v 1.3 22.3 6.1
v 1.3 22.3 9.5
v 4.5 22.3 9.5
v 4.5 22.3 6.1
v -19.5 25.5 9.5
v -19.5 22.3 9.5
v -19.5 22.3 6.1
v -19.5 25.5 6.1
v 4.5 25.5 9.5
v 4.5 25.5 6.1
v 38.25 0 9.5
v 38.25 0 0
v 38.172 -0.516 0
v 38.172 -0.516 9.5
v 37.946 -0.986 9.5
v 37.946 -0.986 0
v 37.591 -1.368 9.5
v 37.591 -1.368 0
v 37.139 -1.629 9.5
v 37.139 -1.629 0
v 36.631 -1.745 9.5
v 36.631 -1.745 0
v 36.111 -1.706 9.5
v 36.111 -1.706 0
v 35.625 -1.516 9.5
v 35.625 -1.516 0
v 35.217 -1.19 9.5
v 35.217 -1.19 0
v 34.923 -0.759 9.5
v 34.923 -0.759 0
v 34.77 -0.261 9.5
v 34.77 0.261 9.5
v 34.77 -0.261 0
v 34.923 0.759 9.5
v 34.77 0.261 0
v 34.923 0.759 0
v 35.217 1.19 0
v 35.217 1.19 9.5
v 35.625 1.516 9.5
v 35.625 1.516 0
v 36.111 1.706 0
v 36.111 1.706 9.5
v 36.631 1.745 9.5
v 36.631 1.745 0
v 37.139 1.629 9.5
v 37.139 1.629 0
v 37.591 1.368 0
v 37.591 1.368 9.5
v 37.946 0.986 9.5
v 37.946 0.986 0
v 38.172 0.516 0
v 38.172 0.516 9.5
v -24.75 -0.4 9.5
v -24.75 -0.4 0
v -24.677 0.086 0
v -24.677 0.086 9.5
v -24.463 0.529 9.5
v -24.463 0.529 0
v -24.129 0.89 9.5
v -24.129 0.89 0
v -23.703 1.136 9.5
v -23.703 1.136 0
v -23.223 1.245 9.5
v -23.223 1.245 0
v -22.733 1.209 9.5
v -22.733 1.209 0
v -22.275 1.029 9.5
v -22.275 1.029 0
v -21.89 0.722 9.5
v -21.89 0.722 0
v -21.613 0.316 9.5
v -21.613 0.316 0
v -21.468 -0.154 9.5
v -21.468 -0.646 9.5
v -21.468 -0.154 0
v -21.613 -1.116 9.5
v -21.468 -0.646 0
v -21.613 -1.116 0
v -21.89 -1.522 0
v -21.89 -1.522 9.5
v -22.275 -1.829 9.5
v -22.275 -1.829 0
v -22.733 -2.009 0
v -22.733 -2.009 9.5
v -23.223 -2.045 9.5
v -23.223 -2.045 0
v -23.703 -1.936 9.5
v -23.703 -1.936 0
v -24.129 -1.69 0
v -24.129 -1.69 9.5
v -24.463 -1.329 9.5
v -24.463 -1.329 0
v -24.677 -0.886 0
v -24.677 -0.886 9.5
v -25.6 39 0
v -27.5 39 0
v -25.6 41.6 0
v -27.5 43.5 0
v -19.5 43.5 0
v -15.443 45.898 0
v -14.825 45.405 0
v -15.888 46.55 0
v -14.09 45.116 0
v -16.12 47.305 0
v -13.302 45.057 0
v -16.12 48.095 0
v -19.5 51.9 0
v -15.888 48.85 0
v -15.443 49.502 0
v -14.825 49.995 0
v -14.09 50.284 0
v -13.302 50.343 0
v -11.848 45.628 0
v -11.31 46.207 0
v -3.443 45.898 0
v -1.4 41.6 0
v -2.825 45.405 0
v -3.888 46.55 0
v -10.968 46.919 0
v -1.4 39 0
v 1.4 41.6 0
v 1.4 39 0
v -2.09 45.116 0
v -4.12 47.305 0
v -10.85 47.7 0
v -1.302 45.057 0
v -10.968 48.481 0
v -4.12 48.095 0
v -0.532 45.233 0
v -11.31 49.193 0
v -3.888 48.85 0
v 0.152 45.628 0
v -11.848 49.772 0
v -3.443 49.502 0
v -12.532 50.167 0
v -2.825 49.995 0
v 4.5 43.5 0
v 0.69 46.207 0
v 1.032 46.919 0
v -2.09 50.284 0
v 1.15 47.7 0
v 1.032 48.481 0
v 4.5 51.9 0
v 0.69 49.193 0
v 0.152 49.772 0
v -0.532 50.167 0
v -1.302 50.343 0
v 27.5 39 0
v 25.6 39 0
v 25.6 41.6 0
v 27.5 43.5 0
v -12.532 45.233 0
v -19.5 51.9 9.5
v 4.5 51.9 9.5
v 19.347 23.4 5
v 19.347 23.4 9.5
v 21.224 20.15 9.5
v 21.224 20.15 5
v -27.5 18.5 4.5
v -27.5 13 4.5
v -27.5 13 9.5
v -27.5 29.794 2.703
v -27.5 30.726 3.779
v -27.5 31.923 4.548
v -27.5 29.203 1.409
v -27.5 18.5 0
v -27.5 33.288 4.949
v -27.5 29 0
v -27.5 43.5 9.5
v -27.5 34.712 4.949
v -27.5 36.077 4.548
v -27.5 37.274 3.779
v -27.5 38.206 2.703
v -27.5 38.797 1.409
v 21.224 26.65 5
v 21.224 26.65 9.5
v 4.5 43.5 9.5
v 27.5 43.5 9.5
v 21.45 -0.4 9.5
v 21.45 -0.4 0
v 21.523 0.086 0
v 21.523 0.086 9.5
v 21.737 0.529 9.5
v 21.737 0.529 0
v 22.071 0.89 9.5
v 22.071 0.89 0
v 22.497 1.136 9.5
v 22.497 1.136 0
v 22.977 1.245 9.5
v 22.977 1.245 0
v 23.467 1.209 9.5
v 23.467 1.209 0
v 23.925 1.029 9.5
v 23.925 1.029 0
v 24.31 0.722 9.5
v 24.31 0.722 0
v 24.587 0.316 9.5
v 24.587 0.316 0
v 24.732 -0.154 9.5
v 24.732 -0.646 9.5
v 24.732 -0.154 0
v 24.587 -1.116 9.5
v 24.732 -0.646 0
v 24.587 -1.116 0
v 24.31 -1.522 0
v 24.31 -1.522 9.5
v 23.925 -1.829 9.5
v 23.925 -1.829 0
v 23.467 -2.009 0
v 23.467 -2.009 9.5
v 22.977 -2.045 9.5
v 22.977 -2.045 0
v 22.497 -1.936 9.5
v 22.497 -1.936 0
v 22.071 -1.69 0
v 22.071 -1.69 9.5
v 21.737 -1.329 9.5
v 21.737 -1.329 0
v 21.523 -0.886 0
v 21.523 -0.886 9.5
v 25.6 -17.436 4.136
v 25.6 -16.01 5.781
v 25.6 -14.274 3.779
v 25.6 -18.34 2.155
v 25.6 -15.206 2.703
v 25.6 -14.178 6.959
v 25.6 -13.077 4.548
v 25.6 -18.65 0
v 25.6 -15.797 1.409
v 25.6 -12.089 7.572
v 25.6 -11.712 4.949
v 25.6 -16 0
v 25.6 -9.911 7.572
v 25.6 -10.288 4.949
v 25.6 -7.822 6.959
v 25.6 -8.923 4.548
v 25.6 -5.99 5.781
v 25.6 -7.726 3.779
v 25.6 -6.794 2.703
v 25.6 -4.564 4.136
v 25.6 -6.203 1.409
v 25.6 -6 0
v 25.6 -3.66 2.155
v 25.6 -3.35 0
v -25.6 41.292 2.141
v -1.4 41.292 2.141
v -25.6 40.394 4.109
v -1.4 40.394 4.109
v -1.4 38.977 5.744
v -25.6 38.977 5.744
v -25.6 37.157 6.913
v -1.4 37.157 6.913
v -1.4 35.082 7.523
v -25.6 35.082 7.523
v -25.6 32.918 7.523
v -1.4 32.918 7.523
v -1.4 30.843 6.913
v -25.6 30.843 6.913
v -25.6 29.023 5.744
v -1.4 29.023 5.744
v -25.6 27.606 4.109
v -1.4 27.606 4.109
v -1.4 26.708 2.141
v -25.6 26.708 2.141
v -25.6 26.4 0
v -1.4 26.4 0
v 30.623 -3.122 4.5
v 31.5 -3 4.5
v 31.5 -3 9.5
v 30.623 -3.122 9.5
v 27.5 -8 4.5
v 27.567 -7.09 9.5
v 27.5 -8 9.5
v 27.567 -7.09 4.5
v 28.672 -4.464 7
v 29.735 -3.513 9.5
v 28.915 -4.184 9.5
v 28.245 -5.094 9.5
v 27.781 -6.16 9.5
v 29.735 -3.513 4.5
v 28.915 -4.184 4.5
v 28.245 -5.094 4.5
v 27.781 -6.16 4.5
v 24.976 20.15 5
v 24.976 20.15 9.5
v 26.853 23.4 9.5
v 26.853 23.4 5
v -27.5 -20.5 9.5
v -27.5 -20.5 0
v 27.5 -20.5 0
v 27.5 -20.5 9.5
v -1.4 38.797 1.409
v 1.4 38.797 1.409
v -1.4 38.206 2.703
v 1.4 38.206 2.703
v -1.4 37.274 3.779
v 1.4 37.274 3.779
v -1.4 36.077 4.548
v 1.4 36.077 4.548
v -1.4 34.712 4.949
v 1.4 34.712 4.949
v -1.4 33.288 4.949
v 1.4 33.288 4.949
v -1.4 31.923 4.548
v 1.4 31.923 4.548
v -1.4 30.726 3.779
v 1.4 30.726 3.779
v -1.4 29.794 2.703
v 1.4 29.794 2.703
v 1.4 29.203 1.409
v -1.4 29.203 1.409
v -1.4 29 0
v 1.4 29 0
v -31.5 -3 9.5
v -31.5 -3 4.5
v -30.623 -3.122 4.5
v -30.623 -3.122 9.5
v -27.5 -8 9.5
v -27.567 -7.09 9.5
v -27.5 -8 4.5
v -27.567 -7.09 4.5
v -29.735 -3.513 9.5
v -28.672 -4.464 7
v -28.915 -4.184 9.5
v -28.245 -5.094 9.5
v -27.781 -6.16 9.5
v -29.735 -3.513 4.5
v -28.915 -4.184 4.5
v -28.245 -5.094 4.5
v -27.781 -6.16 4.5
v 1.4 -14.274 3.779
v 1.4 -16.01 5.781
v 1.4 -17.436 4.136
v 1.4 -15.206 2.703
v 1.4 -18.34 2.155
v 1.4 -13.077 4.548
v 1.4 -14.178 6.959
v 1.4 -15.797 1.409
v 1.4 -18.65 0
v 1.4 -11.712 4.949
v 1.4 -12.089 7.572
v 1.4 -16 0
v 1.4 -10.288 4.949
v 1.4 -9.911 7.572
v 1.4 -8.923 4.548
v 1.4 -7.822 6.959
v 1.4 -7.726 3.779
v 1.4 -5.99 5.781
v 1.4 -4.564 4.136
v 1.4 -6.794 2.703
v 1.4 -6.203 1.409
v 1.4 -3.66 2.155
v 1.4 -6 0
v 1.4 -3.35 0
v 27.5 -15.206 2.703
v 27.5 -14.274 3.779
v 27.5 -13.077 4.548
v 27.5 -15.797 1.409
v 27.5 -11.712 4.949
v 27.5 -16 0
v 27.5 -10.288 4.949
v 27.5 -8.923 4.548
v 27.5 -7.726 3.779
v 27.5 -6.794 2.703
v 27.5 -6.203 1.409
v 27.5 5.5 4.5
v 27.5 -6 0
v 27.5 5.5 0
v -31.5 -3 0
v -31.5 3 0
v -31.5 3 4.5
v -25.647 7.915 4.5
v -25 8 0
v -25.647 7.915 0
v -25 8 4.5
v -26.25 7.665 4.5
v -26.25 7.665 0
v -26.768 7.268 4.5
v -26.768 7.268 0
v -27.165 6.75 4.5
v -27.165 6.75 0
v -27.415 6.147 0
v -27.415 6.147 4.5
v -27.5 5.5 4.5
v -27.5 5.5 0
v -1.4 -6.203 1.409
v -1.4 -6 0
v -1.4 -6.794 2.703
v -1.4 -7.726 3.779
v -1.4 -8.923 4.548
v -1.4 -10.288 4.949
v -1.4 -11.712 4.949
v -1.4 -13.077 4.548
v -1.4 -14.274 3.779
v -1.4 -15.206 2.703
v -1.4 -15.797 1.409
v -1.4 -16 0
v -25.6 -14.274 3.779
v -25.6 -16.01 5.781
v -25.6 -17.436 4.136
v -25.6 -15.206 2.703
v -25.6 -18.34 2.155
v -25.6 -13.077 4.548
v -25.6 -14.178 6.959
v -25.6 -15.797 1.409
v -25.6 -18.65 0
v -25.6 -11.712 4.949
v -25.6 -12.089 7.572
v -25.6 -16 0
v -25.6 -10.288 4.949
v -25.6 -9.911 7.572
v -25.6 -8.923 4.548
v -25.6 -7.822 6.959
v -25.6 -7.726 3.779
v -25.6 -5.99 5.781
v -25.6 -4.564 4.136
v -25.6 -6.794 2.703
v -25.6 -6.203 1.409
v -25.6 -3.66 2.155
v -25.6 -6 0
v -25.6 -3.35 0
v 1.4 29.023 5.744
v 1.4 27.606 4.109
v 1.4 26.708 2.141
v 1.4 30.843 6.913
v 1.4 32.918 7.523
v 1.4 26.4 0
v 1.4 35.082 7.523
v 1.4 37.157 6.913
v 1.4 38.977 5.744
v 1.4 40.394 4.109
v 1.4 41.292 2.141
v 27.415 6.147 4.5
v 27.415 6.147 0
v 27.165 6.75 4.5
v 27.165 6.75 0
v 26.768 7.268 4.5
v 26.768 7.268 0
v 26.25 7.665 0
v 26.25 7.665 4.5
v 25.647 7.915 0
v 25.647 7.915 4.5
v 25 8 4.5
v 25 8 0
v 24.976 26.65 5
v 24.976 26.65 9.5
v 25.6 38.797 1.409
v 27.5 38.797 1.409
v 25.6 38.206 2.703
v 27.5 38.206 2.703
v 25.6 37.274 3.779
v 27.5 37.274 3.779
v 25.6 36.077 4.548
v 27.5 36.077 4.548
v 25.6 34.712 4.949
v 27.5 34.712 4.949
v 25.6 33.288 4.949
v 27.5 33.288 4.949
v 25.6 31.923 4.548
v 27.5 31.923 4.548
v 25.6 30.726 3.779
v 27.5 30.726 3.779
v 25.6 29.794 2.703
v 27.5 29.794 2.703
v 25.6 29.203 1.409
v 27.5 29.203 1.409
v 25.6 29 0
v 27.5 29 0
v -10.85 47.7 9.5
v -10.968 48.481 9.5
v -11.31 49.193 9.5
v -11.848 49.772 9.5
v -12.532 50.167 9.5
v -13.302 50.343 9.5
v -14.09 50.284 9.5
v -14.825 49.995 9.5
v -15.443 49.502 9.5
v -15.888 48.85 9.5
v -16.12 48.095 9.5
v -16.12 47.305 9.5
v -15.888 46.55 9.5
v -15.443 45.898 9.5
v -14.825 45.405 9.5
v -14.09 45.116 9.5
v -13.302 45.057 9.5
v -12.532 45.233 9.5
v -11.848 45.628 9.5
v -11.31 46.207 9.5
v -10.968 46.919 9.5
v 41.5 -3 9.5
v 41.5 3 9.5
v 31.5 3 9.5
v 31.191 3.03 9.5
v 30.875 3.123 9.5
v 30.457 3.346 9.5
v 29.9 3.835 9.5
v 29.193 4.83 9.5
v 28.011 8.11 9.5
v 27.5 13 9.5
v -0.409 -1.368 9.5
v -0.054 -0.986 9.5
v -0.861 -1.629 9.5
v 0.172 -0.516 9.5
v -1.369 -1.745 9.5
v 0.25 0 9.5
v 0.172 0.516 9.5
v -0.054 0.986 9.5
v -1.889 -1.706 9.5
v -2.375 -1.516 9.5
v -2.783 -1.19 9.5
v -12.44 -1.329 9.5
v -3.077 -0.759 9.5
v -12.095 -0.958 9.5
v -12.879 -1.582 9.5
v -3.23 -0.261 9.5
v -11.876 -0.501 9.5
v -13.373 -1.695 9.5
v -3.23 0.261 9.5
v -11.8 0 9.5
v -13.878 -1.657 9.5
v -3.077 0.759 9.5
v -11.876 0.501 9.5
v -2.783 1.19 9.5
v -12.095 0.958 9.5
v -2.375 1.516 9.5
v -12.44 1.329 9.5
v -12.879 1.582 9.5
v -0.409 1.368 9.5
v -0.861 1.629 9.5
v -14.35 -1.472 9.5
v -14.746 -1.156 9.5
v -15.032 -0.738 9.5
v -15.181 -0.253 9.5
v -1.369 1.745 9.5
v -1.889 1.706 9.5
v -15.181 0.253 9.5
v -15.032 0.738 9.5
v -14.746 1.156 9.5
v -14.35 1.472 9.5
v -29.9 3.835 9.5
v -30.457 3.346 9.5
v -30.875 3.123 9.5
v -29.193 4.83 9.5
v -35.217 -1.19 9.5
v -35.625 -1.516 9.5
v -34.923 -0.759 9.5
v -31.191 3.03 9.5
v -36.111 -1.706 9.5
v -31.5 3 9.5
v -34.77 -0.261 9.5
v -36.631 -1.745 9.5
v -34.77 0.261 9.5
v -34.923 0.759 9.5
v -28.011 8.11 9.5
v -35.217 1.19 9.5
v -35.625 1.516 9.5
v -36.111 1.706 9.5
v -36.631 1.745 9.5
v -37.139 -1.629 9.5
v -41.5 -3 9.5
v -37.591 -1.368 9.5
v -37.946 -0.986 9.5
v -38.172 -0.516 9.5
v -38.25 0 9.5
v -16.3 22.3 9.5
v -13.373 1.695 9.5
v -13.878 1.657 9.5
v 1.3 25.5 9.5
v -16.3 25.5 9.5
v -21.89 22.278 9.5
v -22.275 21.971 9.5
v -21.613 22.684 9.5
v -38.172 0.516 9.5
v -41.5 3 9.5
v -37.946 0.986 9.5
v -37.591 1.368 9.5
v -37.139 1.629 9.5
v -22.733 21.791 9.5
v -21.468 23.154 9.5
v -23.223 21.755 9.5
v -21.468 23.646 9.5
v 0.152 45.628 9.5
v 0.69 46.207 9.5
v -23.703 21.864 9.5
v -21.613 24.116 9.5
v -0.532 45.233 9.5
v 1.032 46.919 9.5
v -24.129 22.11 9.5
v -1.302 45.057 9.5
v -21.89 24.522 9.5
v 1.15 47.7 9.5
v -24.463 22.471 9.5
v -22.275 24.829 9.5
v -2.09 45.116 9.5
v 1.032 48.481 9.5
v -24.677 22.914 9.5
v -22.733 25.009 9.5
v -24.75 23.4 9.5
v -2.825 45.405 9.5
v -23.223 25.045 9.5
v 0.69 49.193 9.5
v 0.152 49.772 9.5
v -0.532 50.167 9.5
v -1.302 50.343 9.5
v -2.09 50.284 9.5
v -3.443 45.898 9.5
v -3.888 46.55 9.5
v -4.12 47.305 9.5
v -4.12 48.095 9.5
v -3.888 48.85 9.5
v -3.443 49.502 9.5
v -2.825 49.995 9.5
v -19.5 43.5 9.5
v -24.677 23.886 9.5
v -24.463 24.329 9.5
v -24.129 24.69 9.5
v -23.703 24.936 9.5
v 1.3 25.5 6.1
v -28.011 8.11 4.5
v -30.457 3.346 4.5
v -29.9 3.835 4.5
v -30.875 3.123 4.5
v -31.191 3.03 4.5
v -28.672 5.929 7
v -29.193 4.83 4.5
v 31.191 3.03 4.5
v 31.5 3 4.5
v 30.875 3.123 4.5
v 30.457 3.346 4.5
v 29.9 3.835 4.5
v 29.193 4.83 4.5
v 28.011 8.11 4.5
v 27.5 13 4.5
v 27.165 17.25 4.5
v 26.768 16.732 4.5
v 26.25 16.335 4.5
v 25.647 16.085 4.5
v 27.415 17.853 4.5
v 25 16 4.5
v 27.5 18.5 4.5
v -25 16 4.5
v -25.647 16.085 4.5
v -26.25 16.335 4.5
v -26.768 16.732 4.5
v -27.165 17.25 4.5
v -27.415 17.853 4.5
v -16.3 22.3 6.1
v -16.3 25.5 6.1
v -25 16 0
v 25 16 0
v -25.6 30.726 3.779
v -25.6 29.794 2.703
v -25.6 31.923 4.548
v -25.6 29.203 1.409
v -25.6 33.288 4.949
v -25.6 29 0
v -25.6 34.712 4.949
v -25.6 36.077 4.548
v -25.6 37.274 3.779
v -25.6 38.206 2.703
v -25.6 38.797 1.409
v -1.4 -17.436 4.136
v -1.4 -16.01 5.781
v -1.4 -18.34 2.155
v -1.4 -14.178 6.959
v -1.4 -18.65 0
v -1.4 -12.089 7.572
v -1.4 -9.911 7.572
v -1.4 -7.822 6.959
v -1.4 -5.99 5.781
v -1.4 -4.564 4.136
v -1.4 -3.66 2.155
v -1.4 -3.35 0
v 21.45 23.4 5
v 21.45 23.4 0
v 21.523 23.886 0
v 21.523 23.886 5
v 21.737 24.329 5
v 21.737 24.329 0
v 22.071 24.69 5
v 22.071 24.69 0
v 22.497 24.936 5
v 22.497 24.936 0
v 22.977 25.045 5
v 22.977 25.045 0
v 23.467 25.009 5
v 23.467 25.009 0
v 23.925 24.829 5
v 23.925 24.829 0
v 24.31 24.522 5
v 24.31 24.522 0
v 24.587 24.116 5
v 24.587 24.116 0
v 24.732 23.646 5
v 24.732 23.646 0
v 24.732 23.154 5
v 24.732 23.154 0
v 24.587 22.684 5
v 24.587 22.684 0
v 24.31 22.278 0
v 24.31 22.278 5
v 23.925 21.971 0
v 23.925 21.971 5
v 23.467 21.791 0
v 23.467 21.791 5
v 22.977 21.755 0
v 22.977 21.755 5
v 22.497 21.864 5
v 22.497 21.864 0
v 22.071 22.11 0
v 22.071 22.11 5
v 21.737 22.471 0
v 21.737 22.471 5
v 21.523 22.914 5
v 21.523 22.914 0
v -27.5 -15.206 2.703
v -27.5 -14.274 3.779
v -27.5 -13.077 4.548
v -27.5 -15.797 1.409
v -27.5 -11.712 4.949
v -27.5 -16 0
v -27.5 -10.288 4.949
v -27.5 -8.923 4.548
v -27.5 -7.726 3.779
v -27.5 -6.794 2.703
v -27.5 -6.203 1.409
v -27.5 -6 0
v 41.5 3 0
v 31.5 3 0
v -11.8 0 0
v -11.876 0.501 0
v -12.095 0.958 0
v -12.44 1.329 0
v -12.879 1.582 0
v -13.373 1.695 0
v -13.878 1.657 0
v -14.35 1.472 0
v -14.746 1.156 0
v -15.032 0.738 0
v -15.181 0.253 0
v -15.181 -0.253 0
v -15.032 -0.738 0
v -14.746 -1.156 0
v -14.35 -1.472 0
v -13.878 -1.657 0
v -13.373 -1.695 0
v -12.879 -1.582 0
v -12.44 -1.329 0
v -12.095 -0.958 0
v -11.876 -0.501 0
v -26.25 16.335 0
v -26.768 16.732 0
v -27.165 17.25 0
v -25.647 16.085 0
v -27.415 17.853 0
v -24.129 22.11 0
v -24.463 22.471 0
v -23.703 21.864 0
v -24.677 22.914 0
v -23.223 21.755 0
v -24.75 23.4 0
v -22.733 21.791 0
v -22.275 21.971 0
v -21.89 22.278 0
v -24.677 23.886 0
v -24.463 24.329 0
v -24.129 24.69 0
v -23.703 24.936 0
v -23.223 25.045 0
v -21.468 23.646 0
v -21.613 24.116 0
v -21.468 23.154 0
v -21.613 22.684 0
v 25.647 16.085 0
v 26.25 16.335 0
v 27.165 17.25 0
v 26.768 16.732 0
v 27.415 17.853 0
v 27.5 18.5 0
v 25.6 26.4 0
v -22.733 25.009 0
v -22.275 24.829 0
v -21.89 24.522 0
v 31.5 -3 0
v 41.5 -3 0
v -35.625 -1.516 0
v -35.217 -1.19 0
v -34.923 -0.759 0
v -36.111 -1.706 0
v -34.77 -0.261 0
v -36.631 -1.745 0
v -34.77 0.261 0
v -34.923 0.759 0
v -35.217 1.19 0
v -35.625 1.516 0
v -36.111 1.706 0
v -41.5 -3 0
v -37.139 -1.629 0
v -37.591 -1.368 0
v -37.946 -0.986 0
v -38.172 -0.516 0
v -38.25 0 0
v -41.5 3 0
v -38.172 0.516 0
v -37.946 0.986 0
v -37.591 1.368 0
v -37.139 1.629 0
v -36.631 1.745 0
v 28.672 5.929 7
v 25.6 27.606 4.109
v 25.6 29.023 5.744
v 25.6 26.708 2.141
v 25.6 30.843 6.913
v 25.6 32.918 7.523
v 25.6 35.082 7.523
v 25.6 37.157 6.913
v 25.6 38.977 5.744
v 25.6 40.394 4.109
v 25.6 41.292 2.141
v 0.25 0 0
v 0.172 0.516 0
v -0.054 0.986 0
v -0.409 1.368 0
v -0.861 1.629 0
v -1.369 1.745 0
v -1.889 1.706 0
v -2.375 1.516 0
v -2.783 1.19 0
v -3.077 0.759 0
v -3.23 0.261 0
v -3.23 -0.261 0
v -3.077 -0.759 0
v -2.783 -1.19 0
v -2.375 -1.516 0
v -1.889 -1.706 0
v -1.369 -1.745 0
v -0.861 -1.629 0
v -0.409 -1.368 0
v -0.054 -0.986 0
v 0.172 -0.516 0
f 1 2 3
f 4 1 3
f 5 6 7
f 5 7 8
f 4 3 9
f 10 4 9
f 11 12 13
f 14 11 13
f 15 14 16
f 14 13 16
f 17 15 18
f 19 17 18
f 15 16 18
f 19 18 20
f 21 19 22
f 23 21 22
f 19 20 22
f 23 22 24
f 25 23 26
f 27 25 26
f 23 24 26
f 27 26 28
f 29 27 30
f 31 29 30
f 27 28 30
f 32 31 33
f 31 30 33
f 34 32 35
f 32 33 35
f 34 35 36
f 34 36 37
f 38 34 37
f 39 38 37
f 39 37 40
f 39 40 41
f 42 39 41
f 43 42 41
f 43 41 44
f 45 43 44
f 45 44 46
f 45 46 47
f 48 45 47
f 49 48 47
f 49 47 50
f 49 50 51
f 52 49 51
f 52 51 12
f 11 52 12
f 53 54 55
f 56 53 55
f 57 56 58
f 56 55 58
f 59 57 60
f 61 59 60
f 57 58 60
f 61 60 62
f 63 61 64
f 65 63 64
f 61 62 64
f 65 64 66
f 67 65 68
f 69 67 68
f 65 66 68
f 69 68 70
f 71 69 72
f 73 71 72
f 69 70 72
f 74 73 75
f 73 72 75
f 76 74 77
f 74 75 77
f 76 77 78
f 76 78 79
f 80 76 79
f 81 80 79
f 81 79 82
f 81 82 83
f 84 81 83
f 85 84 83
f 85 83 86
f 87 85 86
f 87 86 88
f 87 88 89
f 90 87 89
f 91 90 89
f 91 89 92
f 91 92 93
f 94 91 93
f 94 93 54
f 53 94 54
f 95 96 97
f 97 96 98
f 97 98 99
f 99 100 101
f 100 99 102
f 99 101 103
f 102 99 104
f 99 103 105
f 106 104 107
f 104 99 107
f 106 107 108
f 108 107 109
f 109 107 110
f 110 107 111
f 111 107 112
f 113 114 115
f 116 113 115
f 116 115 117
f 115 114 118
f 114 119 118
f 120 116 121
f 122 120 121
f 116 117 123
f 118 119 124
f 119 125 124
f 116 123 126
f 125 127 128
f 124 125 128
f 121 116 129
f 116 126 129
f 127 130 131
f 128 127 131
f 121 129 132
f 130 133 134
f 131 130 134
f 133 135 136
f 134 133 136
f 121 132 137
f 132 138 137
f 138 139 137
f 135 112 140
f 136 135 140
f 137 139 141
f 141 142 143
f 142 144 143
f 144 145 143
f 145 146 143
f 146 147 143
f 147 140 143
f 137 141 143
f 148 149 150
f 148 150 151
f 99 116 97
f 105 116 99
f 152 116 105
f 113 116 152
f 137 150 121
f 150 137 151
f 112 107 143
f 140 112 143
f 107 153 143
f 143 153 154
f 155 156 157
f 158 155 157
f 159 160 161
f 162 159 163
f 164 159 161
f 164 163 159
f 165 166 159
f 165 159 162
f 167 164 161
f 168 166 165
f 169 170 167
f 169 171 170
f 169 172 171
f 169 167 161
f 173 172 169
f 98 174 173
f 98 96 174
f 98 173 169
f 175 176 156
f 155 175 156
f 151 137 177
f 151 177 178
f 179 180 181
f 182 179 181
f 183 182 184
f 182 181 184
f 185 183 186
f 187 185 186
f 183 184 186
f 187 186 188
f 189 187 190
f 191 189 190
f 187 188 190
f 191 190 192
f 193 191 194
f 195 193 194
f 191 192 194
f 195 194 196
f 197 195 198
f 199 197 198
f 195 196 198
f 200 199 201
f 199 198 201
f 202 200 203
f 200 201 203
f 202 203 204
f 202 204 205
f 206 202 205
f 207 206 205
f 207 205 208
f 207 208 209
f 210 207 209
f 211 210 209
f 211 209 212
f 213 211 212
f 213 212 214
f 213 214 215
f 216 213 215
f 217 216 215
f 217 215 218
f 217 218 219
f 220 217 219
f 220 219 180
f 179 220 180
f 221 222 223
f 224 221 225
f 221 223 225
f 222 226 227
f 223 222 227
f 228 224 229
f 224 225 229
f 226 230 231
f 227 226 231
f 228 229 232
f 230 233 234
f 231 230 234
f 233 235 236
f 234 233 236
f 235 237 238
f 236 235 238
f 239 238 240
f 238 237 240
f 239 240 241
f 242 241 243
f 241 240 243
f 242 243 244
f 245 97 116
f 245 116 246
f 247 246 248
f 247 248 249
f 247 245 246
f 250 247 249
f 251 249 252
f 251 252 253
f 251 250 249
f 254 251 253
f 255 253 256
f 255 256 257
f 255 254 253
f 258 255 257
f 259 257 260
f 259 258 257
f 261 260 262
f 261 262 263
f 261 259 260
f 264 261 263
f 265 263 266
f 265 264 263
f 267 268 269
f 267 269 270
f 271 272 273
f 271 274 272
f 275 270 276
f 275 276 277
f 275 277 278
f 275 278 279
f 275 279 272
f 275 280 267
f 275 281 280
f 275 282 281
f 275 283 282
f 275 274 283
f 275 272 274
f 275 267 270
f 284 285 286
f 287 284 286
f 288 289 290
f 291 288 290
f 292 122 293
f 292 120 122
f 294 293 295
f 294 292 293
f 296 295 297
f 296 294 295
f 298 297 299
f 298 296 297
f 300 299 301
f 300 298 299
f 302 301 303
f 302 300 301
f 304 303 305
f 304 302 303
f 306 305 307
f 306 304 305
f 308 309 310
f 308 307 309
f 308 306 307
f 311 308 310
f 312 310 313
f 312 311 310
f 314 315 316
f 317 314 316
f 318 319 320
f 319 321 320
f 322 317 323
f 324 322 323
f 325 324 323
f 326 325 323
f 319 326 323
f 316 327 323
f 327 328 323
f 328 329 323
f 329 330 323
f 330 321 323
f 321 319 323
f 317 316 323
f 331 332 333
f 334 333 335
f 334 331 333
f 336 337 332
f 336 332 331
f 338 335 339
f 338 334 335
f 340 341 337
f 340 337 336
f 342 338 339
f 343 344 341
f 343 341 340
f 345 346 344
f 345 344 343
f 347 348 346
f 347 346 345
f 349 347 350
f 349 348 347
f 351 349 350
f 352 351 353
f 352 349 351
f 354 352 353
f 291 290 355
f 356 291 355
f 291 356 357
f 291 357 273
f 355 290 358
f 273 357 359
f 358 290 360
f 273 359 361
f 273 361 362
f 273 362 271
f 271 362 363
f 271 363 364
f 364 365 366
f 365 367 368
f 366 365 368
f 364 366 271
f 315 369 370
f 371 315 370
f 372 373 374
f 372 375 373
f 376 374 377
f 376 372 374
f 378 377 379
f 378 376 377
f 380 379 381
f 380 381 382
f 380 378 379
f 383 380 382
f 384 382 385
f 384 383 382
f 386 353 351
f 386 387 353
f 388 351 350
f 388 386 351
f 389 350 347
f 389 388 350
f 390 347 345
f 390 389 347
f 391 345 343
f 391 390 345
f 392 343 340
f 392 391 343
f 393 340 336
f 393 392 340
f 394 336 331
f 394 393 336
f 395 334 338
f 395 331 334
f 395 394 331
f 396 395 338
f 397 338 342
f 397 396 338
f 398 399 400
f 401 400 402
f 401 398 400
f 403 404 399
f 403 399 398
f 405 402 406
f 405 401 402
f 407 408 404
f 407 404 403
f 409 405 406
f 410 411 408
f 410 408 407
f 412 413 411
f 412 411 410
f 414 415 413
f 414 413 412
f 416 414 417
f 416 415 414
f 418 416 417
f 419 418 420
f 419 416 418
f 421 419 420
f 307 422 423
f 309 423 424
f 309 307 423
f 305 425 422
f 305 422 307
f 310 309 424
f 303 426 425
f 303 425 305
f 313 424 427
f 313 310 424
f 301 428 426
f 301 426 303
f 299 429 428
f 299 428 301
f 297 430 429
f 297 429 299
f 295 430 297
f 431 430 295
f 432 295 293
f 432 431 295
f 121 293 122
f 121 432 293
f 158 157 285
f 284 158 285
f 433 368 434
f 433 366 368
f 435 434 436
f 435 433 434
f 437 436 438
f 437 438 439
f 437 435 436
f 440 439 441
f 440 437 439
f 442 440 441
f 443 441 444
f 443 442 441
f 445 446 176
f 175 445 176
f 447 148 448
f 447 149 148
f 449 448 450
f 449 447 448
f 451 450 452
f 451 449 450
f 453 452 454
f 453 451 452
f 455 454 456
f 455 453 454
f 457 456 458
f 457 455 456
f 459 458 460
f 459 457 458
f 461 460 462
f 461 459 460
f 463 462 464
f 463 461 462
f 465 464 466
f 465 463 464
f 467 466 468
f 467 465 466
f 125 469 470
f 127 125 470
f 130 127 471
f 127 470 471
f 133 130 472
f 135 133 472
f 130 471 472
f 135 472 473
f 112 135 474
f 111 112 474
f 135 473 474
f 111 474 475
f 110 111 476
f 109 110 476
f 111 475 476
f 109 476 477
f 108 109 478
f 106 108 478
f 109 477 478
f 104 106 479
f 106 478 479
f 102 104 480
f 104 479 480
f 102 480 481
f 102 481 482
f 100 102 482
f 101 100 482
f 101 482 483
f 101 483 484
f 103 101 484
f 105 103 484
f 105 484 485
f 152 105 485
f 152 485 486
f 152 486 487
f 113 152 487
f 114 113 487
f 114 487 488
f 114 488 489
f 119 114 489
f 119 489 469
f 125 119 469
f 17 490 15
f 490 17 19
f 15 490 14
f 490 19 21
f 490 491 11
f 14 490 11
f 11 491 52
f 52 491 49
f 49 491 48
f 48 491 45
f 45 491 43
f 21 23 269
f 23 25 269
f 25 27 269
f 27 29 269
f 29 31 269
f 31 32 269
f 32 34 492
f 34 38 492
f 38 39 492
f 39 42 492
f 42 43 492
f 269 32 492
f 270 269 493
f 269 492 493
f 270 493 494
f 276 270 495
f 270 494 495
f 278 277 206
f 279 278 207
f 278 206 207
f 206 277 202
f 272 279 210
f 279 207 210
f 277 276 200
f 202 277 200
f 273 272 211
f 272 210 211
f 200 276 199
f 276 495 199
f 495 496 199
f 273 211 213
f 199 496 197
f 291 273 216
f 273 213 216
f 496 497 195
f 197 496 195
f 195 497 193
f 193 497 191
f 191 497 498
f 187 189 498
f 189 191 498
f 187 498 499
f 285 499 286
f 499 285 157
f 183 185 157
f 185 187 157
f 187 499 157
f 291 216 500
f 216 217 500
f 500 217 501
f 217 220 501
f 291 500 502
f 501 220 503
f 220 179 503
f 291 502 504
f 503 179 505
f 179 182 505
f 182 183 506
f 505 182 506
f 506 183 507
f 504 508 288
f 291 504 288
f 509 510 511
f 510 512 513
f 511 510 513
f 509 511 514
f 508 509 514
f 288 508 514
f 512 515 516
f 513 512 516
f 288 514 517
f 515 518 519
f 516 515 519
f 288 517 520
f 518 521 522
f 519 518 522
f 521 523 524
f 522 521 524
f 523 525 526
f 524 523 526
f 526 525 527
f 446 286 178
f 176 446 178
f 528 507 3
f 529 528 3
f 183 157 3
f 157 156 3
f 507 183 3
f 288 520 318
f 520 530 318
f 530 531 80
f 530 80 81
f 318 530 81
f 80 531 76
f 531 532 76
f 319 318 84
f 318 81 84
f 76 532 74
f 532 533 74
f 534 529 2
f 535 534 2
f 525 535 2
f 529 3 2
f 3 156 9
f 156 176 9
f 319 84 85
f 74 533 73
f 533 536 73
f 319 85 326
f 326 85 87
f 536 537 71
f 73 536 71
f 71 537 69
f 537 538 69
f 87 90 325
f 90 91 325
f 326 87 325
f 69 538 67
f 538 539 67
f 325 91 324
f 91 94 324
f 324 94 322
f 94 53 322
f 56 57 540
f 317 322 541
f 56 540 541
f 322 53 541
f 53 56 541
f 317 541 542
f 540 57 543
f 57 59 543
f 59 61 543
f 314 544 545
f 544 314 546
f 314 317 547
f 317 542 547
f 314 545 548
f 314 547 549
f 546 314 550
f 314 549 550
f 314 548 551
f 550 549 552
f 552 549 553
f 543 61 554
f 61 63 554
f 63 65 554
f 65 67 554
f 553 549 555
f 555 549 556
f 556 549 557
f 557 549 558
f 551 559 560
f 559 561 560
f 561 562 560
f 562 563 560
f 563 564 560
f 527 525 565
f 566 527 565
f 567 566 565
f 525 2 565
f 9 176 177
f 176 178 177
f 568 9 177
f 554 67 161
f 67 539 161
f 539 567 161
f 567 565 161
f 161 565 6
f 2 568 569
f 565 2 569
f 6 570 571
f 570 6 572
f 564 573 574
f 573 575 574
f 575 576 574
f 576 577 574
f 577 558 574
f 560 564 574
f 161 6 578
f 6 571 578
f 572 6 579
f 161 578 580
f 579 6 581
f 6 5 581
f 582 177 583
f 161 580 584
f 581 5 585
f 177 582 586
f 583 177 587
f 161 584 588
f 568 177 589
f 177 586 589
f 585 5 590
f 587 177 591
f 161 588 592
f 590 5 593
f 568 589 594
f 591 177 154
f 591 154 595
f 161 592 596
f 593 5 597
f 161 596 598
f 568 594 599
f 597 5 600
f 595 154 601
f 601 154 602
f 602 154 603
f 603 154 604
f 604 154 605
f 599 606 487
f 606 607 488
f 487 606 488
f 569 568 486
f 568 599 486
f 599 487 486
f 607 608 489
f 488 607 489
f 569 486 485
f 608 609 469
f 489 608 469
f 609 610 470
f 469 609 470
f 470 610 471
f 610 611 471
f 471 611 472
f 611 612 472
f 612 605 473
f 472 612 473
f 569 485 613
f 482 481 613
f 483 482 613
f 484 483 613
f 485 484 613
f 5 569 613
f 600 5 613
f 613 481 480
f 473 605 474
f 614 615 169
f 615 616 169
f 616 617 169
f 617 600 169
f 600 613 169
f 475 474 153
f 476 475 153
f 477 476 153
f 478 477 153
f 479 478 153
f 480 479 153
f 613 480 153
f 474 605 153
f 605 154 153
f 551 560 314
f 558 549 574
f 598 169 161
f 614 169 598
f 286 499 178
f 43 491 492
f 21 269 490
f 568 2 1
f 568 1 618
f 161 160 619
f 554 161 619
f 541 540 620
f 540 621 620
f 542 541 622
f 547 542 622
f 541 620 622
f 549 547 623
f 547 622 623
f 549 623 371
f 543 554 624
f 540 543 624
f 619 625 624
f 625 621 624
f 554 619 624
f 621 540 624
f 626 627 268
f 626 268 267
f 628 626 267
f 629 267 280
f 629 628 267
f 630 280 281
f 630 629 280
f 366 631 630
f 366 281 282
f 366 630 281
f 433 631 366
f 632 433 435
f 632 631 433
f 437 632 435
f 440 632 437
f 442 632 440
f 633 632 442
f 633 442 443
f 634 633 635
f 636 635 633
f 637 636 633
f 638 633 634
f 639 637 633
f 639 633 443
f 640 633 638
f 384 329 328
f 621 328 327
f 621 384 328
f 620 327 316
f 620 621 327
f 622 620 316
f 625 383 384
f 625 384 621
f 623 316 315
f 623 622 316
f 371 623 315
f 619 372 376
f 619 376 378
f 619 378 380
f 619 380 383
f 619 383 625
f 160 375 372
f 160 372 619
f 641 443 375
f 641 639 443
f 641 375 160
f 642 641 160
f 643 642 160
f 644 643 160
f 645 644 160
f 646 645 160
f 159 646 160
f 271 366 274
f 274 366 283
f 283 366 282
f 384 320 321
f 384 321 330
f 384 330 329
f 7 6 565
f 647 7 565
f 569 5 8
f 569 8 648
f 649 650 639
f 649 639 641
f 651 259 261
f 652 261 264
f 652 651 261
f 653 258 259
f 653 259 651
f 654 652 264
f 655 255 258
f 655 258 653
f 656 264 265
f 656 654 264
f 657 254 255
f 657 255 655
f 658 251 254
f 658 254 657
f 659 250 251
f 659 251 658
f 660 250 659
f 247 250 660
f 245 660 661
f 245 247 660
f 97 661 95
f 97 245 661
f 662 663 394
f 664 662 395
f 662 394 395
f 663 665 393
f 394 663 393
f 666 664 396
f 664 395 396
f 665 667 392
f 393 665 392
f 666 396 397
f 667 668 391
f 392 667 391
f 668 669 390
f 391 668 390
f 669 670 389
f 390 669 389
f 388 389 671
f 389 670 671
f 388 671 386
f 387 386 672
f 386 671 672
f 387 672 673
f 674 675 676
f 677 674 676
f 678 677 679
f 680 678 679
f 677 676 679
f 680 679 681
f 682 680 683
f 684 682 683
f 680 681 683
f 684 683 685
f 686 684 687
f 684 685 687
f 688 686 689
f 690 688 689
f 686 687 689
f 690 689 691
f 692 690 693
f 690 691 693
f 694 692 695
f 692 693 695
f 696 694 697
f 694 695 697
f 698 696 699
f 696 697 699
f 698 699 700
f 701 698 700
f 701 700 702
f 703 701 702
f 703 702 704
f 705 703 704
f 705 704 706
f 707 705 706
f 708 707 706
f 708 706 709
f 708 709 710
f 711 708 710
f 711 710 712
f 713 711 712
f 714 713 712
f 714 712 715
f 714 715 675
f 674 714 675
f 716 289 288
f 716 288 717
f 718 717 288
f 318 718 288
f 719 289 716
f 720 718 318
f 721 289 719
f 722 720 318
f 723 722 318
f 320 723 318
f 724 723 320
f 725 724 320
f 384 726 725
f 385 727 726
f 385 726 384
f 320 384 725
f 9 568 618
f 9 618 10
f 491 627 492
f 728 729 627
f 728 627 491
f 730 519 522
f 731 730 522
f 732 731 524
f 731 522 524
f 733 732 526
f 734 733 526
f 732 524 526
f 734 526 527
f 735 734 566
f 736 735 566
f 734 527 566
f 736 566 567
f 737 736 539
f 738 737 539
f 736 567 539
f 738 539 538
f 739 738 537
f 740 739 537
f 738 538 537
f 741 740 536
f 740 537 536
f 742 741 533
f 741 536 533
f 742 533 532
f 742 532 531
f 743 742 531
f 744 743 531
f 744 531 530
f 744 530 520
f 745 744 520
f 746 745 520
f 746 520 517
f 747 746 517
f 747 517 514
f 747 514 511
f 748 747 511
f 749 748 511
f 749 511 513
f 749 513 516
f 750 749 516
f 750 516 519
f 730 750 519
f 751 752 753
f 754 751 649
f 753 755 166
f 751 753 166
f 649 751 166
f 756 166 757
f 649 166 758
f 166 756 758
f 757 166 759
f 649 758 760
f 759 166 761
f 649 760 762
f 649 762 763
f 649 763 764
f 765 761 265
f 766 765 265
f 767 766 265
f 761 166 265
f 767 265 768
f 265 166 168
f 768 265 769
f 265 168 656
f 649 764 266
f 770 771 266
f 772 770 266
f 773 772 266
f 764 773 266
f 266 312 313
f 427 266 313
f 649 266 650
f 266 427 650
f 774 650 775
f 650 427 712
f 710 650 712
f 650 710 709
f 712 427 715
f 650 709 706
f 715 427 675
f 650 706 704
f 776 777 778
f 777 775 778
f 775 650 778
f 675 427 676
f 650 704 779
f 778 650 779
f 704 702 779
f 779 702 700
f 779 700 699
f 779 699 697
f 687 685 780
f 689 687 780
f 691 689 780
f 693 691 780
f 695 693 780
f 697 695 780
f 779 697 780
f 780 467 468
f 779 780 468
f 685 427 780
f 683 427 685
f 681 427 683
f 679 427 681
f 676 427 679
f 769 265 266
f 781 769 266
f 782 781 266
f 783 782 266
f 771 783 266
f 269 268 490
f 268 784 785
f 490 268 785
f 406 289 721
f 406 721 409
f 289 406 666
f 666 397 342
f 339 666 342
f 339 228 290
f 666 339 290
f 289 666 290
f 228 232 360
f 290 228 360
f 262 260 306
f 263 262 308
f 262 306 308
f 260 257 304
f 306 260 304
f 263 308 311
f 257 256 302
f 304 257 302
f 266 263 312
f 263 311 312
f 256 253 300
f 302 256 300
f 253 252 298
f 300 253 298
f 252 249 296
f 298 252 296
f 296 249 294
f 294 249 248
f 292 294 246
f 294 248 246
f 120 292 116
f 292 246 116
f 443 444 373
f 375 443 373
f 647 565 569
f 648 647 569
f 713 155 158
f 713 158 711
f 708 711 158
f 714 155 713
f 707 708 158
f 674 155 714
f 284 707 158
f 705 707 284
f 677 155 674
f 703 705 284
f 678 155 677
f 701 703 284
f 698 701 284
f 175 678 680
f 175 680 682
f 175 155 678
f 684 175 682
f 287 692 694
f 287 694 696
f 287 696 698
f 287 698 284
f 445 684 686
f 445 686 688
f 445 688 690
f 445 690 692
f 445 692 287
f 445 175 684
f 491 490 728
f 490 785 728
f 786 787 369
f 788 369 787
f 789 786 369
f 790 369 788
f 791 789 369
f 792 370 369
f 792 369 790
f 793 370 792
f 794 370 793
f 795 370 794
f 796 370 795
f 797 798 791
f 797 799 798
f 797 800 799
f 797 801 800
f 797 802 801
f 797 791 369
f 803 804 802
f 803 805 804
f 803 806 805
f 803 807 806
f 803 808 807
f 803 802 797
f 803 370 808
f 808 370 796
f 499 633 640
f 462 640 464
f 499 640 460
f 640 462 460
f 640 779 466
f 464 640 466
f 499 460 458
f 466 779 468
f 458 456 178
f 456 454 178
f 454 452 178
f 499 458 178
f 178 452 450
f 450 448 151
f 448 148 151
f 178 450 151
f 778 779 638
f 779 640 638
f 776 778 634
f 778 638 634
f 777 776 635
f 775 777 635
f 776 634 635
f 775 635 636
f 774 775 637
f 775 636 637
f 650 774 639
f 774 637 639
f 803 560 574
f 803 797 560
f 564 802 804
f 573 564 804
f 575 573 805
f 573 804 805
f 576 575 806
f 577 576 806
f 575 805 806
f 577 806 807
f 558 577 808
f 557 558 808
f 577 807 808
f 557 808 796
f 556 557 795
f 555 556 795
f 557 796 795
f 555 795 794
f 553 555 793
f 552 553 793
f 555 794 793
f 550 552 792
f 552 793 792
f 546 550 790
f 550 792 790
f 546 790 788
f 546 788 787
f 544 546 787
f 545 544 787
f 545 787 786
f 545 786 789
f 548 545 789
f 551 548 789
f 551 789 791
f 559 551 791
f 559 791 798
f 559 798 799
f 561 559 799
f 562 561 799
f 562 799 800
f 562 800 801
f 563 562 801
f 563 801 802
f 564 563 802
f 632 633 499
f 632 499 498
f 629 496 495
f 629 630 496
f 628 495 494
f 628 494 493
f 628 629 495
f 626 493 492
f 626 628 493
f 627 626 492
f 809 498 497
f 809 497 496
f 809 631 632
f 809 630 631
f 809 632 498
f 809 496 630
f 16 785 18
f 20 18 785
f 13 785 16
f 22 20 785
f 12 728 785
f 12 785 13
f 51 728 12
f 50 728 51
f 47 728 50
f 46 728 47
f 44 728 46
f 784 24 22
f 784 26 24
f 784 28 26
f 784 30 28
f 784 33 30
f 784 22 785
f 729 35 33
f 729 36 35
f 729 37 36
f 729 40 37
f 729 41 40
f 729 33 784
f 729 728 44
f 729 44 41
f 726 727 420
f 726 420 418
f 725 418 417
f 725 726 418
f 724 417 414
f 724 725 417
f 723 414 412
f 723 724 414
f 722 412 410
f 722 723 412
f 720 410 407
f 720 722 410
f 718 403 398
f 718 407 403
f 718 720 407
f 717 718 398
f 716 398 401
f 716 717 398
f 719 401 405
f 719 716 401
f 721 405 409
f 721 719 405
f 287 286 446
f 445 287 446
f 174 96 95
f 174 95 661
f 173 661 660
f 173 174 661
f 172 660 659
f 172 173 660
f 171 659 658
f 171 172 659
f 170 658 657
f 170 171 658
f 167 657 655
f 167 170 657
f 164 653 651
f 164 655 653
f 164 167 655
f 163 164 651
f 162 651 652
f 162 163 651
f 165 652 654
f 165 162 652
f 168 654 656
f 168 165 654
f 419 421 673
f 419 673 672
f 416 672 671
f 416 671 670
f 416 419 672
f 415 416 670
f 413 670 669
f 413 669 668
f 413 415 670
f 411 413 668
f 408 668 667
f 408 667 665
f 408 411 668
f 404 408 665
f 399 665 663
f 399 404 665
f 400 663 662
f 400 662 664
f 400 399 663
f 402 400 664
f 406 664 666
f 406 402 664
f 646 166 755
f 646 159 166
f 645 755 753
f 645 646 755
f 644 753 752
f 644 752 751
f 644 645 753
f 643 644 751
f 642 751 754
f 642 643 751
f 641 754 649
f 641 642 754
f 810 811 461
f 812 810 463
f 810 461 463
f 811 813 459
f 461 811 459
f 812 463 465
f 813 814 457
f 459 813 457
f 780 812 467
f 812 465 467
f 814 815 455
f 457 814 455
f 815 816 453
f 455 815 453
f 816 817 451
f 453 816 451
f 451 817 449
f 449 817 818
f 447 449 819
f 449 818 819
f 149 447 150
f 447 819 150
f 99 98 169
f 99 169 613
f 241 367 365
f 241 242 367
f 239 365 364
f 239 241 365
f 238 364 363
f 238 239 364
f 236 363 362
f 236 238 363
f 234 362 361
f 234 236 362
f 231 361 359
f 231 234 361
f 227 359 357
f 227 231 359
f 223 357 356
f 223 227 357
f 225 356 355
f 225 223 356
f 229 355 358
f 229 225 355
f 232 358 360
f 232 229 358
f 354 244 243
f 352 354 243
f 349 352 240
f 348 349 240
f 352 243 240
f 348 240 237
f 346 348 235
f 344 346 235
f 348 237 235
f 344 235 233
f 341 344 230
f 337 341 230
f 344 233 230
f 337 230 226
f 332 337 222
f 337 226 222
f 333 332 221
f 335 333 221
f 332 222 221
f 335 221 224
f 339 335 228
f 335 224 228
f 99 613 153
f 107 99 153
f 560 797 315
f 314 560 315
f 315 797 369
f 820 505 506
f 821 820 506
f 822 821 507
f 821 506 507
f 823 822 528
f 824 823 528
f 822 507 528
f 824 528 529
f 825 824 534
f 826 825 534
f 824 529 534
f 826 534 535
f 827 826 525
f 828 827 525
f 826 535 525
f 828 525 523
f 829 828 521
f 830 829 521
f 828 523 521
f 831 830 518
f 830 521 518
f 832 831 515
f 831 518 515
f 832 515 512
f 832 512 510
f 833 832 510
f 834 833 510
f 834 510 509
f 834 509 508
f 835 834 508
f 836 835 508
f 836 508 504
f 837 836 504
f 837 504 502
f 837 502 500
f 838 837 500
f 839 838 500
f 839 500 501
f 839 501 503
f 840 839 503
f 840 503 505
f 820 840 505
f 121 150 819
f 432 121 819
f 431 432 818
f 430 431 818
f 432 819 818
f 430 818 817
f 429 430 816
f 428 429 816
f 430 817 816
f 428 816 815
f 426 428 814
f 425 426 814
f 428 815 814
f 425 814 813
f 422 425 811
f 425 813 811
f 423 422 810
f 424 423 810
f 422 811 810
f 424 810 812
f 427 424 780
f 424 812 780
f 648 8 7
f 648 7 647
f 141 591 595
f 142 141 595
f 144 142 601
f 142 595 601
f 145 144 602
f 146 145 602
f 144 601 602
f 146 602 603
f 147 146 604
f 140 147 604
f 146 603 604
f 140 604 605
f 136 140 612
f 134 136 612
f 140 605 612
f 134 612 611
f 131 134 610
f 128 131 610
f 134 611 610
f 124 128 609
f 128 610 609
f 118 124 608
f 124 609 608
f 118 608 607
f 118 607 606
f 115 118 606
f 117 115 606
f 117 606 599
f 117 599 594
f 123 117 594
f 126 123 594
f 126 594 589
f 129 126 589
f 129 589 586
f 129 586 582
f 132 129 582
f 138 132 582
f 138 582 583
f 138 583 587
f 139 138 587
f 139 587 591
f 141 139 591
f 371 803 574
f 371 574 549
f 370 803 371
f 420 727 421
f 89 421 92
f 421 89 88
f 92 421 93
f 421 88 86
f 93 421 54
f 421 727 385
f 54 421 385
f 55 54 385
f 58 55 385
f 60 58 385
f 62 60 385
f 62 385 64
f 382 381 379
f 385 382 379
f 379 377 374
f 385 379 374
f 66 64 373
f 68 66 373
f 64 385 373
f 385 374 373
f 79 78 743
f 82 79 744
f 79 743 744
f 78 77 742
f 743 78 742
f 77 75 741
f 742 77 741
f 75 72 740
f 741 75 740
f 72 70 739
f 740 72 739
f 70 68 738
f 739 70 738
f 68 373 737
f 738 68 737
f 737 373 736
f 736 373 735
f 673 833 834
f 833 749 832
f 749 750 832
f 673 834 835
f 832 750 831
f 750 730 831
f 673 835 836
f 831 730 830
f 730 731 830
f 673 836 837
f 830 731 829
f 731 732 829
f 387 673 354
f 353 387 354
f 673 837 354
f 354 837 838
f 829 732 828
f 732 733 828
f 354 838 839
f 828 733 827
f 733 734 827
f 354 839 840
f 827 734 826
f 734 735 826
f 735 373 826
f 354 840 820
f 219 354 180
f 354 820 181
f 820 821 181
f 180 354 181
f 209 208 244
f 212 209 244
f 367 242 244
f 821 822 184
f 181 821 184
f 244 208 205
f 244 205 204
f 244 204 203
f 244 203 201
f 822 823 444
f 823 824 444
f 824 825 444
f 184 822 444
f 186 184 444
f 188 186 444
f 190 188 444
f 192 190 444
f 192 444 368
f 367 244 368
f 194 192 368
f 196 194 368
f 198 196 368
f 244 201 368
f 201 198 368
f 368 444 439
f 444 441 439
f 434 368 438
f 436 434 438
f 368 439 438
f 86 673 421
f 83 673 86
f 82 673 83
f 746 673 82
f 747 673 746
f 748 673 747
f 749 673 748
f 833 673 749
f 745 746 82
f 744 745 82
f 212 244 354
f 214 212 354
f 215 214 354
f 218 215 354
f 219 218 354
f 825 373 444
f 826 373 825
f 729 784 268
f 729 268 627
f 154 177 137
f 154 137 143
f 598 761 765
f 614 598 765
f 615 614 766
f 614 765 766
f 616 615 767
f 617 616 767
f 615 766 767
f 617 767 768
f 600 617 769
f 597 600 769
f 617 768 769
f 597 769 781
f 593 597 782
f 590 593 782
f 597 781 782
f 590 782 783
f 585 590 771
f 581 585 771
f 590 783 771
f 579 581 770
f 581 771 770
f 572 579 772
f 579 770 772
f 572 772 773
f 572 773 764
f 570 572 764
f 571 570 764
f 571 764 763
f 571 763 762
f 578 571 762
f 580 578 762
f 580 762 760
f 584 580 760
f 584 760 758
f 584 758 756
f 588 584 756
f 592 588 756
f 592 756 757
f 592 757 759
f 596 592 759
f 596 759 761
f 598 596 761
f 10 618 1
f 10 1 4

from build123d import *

# Parameters (mm, degrees)
SZKIC8_W                        = 55
SZKIC8_H                        = 64
DODANIE_WYCI_GNI_CIE3_DEPTH     = 9.5
WYTNIJ_WYCI_GNI_CIE2_START      = -1.9
SZKIC9_R                        = 7.6
WYTNIJ_WYCI_GNI_CIE2_DEPTH      = 24.2
WYTNIJ_WYCI_GNI_CIE3_START      = -1.9
SZKIC10_R                       = 7.65
WYTNIJ_WYCI_GNI_CIE3_DEPTH      = 24.2
WYTNIJ_WYCI_GNI_CIE4_DEPTH      = 71.763691255
WYTNIJ_WYCI_GNI_CIE4_DEPTH_BACK = 71.763691255
SZKIC11_R                       = 5
WYTNIJ_WYCI_GNI_CIE25_REACH     = 54.333
SZKIC42_R                       = 1.65
SZKIC43_W                       = 24
SZKIC43_H                       = 8.4
DODANIE_WYCI_GNI_CIE4_DEPTH     = 9.5
WYTNIJ_WYCI_GNI_CIE26_REACH     = 61.499
SZKIC44_R                       = 2.65
SZKIC45_W                       = 3.2
SZKIC45_H                       = 3.2
WYTNIJ_WYCI_GNI_CIE27_DEPTH     = 3.4
SZKIC46_R                       = 1.7
SZKIC46_R_2                     = 1.75
WYTNIJ_WYCI_GNI_CIE28_DEPTH     = 60.498823518
WYTNIJ_WYCI_GNI_CIE29_DEPTH     = 4.5
SZKIC49_W                       = 10
SZKIC49_H                       = 6
DODANIE_WYCI_GNI_CIE5_DEPTH     = 4.5
DODANIE_WYCI_GNI_CIE5_2_DEPTH   = 4.5
SZKIC50_W                       = 14
SZKIC50_H                       = 6
DODANIE_WYCI_GNI_CIE6_DEPTH     = 5
WYTNIJ_WYCI_GNI_CIE31_REACH     = 69.128
SZKIC51_R                       = 1.75
ZAOKR_GLENIE2_SIZE              = 10
ZAOKR_GLENIE2_SIZE_2            = 4
ZAOKR_GLENIE3_SIZE              = 4
ZAOKR_GLENIE3_SIZE_2            = 5
SZKIC52_W                       = 55
SZKIC52_H                       = 8
WYTNIJ_WYCI_GNI_CIE32_DEPTH     = 4.5
ZAOKR_GLENIE4_R                 = 2.5


with BuildPart() as part:
    # Szkic8 → Dodanie-wyciągnięcie3 (new body)
    with BuildSketch(Plane.XY):
        with Locations((0, 11.5)):
            Rectangle(SZKIC8_W, SZKIC8_H)
    extrude(amount=DODANIE_WYCI_GNI_CIE3_DEPTH)

    # Szkic9 → Wytnij-wyciągnięcie2 (cut)
    with BuildSketch(Plane(origin=(27.5, 0, 0), x_dir=(0, 0, -1), z_dir=(1, 0, 0)).offset(WYTNIJ_WYCI_GNI_CIE2_START)):
        with Locations((0, 34)):
            Circle(SZKIC9_R)
    wytnij_wyci_gni_cie2 = extrude(amount=-WYTNIJ_WYCI_GNI_CIE2_DEPTH, mode=Mode.SUBTRACT)

    # Szkic10 → Wytnij-wyciągnięcie3 (cut)
    with BuildSketch(Plane(origin=(27.5, 0, 0), x_dir=(0, 0, -1), z_dir=(1, 0, 0)).offset(WYTNIJ_WYCI_GNI_CIE3_START)):
        with Locations((0, -11)):
            Circle(SZKIC10_R)
    wytnij_wyci_gni_cie3 = extrude(amount=-WYTNIJ_WYCI_GNI_CIE3_DEPTH, mode=Mode.SUBTRACT)

    # Lustro4: Wytnij-wyciągnięcie2, Wytnij-wyciągnięcie3 across plane
    add(wytnij_wyci_gni_cie2.mirror(Plane(origin=(0, 0, 0), x_dir=(0, 0, 1), z_dir=(1, 0, 0))), mode=Mode.SUBTRACT)
    add(wytnij_wyci_gni_cie3.mirror(Plane(origin=(0, 0, 0), x_dir=(0, 0, 1), z_dir=(1, 0, 0))), mode=Mode.SUBTRACT)

    # Szkic11 → Wytnij-wyciągnięcie4 (cut, two sides: drawn at the far end of the back side and taken through both)
    with BuildSketch(Plane(origin=(27.5, 0, 0), x_dir=(0, 0, -1), z_dir=(1, 0, 0)).offset(-WYTNIJ_WYCI_GNI_CIE4_DEPTH_BACK)):
        with Locations((0, 34)):
            Circle(SZKIC11_R)
        with Locations((0, -11)):
            Circle(SZKIC11_R)
    extrude(amount=WYTNIJ_WYCI_GNI_CIE4_DEPTH + WYTNIJ_WYCI_GNI_CIE4_DEPTH_BACK, mode=Mode.SUBTRACT)

    # Szkic42 → Wytnij-wyciągnięcie25 (cut, up to next)
    with BuildSketch(Plane(origin=(0, 0, 0), x_dir=(-1, 0, 0), z_dir=(0, 0, -1)), mode=Mode.PRIVATE) as wytnij_wyci_gni_cie25_sk1:
        with Locations((23.1, 23.4)):
            Circle(SZKIC42_R)
    wytnij_wyci_gni_cie25_tool1 = extrude(wytnij_wyci_gni_cie25_sk1.sketch, amount=-WYTNIJ_WYCI_GNI_CIE25_REACH, mode=Mode.PRIVATE) & part.part
    # Szkic42 → Wytnij-wyciągnięcie25 (cut, up to next)
    with BuildSketch(Plane(origin=(0, 0, 0), x_dir=(-1, 0, 0), z_dir=(0, 0, -1)), mode=Mode.PRIVATE) as wytnij_wyci_gni_cie25_sk2:
        with Locations((23.1, -0.4)):
            Circle(SZKIC42_R)
    wytnij_wyci_gni_cie25_tool2 = extrude(wytnij_wyci_gni_cie25_sk2.sketch, amount=-WYTNIJ_WYCI_GNI_CIE25_REACH, mode=Mode.PRIVATE) & part.part
    # Szkic42 → Wytnij-wyciągnięcie25 (cut, up to next)
    with BuildSketch(Plane(origin=(0, 0, 0), x_dir=(-1, 0, 0), z_dir=(0, 0, -1)), mode=Mode.PRIVATE) as wytnij_wyci_gni_cie25_sk3:
        with Locations((-23.1, -0.4)):
            Circle(SZKIC42_R)
    wytnij_wyci_gni_cie25_tool3 = extrude(wytnij_wyci_gni_cie25_sk3.sketch, amount=-WYTNIJ_WYCI_GNI_CIE25_REACH, mode=Mode.PRIVATE) & part.part
    # Szkic42 → Wytnij-wyciągnięcie25 (cut, up to next)
    with BuildSketch(Plane(origin=(0, 0, 0), x_dir=(-1, 0, 0), z_dir=(0, 0, -1)), mode=Mode.PRIVATE) as wytnij_wyci_gni_cie25_sk4:
        with Locations((-23.1, 23.4)):
            Circle(SZKIC42_R)
    wytnij_wyci_gni_cie25_tool4 = extrude(wytnij_wyci_gni_cie25_sk4.sketch, amount=-WYTNIJ_WYCI_GNI_CIE25_REACH, mode=Mode.PRIVATE) & part.part
    add(wytnij_wyci_gni_cie25_tool1.solids().sort_by_distance((-23.1, 23.4, 0))[0], mode=Mode.SUBTRACT)
    add(wytnij_wyci_gni_cie25_tool2.solids().sort_by_distance((-23.1, -0.4, 0))[0], mode=Mode.SUBTRACT)
    add(wytnij_wyci_gni_cie25_tool3.solids().sort_by_distance((23.1, -0.4, 0))[0], mode=Mode.SUBTRACT)
    add(wytnij_wyci_gni_cie25_tool4.solids().sort_by_distance((23.1, 23.4, 0))[0], mode=Mode.SUBTRACT)

    # Szkic43 → Dodanie-wyciągnięcie4 (add)
    with BuildSketch(Plane.XY.offset(9.5)):
        with Locations((-7.5, 47.7)):
            Rectangle(SZKIC43_W, SZKIC43_H)
    extrude(amount=-DODANIE_WYCI_GNI_CIE4_DEPTH)

    # Szkic44 → Wytnij-wyciągnięcie26 (cut, up to next)
    with BuildSketch(Plane.XY.offset(9.5), mode=Mode.PRIVATE) as wytnij_wyci_gni_cie26_sk1:
        with Locations((-13.5, 47.7)):
            Circle(SZKIC44_R)
    wytnij_wyci_gni_cie26_tool1 = extrude(wytnij_wyci_gni_cie26_sk1.sketch, amount=-WYTNIJ_WYCI_GNI_CIE26_REACH, mode=Mode.PRIVATE) & part.part
    # Szkic44 → Wytnij-wyciągnięcie26 (cut, up to next)
    with BuildSketch(Plane.XY.offset(9.5), mode=Mode.PRIVATE) as wytnij_wyci_gni_cie26_sk2:
        with Locations((-1.5, 47.7)):
            Circle(SZKIC44_R)
    wytnij_wyci_gni_cie26_tool2 = extrude(wytnij_wyci_gni_cie26_sk2.sketch, amount=-WYTNIJ_WYCI_GNI_CIE26_REACH, mode=Mode.PRIVATE) & part.part
    add(wytnij_wyci_gni_cie26_tool1.solids().sort_by_distance((-13.5, 47.7, 9.5))[0], mode=Mode.SUBTRACT)
    add(wytnij_wyci_gni_cie26_tool2.solids().sort_by_distance((-1.5, 47.7, 9.5))[0], mode=Mode.SUBTRACT)

    # Szkic45 → Wytnij-wyciągnięcie27 (cut)
    with BuildSketch(Plane.XY.offset(9.5)):
        with Locations((-17.9, 23.9)):
            Rectangle(SZKIC45_W, SZKIC45_H)
        with Locations((2.9, 23.9)):
            Rectangle(SZKIC45_W, SZKIC45_H)
    extrude(amount=-WYTNIJ_WYCI_GNI_CIE27_DEPTH, mode=Mode.SUBTRACT)

    # Szkic46 → Wytnij-wyciągnięcie28 (cut, through all)
    with BuildSketch(Plane.XY.offset(9.5)):
        with Locations((-13.5, 0)):
            Circle(SZKIC46_R)
        with Locations((-1.5, 0)):
            Circle(SZKIC46_R_2)
    extrude(amount=-WYTNIJ_WYCI_GNI_CIE28_DEPTH, mode=Mode.SUBTRACT)

    # Szkic47 → Wytnij-wyciągnięcie29 (cut)
    with BuildSketch(Plane.XY.offset(9.5)):
        Polygon((21.223611625, 20.15), (24.976388375, 20.15), (26.85277675, 23.4), (24.976388375, 26.65), (21.223611625, 26.65), (19.34722325, 23.4), align=None)
    extrude(amount=-WYTNIJ_WYCI_GNI_CIE29_DEPTH, mode=Mode.SUBTRACT)



with BuildPart() as body_2:
    # Szkic49 → Dodanie-wyciągnięcie5 (new body)
    with BuildSketch(Plane(origin=(0, 0, 0), x_dir=(-1, 0, 0), z_dir=(0, 0, -1))):
        with Locations((36.5, 0)):
            Rectangle(SZKIC49_W, SZKIC49_H)
    extrude(amount=-DODANIE_WYCI_GNI_CIE5_DEPTH)


with BuildPart() as body_3:
    # Szkic49 → Dodanie-wyci_gni_cie5 2 (new body)
    with BuildSketch(Plane(origin=(0, 0, 0), x_dir=(-1, 0, 0), z_dir=(0, 0, -1))):
        with Locations((-36.5, 0)):
            Rectangle(SZKIC49_W, SZKIC49_H)
    extrude(amount=-DODANIE_WYCI_GNI_CIE5_2_DEPTH)


with BuildPart() as part_1:
    add(part.part)

    add(body_2.part)  # Dodanie-wyciągnięcie6 merges body 2

    add(body_3.part)  # Dodanie-wyciągnięcie6 merges body 3
    # Szkic50 → Dodanie-wyciągnięcie6 (add)
    with BuildSketch(Plane.XY.offset(4.5)):
        with Locations((-34.5, 0)):
            Rectangle(SZKIC50_W, SZKIC50_H)
        with Locations((34.5, 0)):
            Rectangle(SZKIC50_W, SZKIC50_H)
    extrude(amount=DODANIE_WYCI_GNI_CIE6_DEPTH)

    # Szkic51 → Wytnij-wyciągnięcie31 (cut, up to next)
    with BuildSketch(Plane(origin=(0, 0, 0), x_dir=(-1, 0, 0), z_dir=(0, 0, -1)), mode=Mode.PRIVATE) as wytnij_wyci_gni_cie31_sk1:
        with Locations((36.5, 0)):
            Circle(SZKIC51_R)
    wytnij_wyci_gni_cie31_tool1 = extrude(wytnij_wyci_gni_cie31_sk1.sketch, amount=-WYTNIJ_WYCI_GNI_CIE31_REACH, mode=Mode.PRIVATE) & part_1.part
    # Szkic51 → Wytnij-wyciągnięcie31 (cut, up to next)
    with BuildSketch(Plane(origin=(0, 0, 0), x_dir=(-1, 0, 0), z_dir=(0, 0, -1)), mode=Mode.PRIVATE) as wytnij_wyci_gni_cie31_sk2:
        with Locations(Location((-36.5, 0, 0), (0, 0, 180))):
            Circle(SZKIC51_R)
    wytnij_wyci_gni_cie31_tool2 = extrude(wytnij_wyci_gni_cie31_sk2.sketch, amount=-WYTNIJ_WYCI_GNI_CIE31_REACH, mode=Mode.PRIVATE) & part_1.part
    add(wytnij_wyci_gni_cie31_tool1.solids().sort_by_distance((-36.5, 0, 0))[0], mode=Mode.SUBTRACT)
    add(wytnij_wyci_gni_cie31_tool2.solids().sort_by_distance((36.5, 0, 0))[0], mode=Mode.SUBTRACT)

    # Zaokrąglenie2
    # an asymmetric fillet: 10, 4 mm, written as the material it adds along each edge
    with BuildSketch(Plane(origin=(-27.5, 3, 4.5), x_dir=(0, 1, 0), z_dir=(0, 0, 1))) as zaokr_glenie2_piece_1:
        with BuildLine():
            Bezier((ZAOKR_GLENIE2_SIZE, 0), (0, 0), (0, ZAOKR_GLENIE2_SIZE_2), weights=[1, 0.707106781, 1])
            Line((0, ZAOKR_GLENIE2_SIZE_2), (0, 0))
            Line((0, 0), (ZAOKR_GLENIE2_SIZE, 0))
        make_face()
    extrude(amount=5)
    with BuildSketch(Plane(origin=(27.5, 3, 4.5), x_dir=(0, 1, 0), z_dir=(0, 0, 1))) as zaokr_glenie2_piece_2:
        with BuildLine():
            Bezier((ZAOKR_GLENIE2_SIZE, 0), (0, 0), (0, -ZAOKR_GLENIE2_SIZE_2), weights=[1, 0.707106781, 1])
            Line((0, -ZAOKR_GLENIE2_SIZE_2), (0, 0))
            Line((0, 0), (ZAOKR_GLENIE2_SIZE, 0))
        make_face()
    extrude(amount=5)

    # Zaokrąglenie3
    # an asymmetric fillet: 5, 4 mm, written as the material it adds along each edge
    with BuildSketch(Plane(origin=(-27.5, -3, 4.5), x_dir=(-1, 0, 0), z_dir=(0, 0, 1))) as zaokr_glenie3_piece_1:
        with BuildLine():
            Bezier((ZAOKR_GLENIE3_SIZE, 0), (0, 0), (0, ZAOKR_GLENIE3_SIZE_2), weights=[1, 0.707106781, 1])
            Line((0, ZAOKR_GLENIE3_SIZE_2), (0, 0))
            Line((0, 0), (ZAOKR_GLENIE3_SIZE, 0))
        make_face()
    extrude(amount=5)
    with BuildSketch(Plane(origin=(27.5, -3, 4.5), x_dir=(1, 0, 0), z_dir=(0, 0, 1))) as zaokr_glenie3_piece_2:
        with BuildLine():
            Bezier((ZAOKR_GLENIE3_SIZE, 0), (0, 0), (0, -ZAOKR_GLENIE3_SIZE_2), weights=[1, 0.707106781, 1])
            Line((0, -ZAOKR_GLENIE3_SIZE_2), (0, 0))
            Line((0, 0), (ZAOKR_GLENIE3_SIZE, 0))
        make_face()
    extrude(amount=5)

    # Szkic52 → Wytnij-wyciągnięcie32 (cut)
    with BuildSketch(Plane(origin=(0, 0, 0), x_dir=(-1, 0, 0), z_dir=(0, 0, -1))):
        with Locations((0, 12)):
            Rectangle(SZKIC52_W, SZKIC52_H)
    extrude(amount=-WYTNIJ_WYCI_GNI_CIE32_DEPTH, mode=Mode.SUBTRACT)

    # Zaokrąglenie4
    zaokr_glenie4_edges = [part_1.edges().sort_by_distance(p)[0] for p in [
        (27.5, 8, 2.25),
        (27.5, 16, 2.25),
        (-27.5, 8, 2.25),
        (-27.5, 16, 2.25),
    ]]
    fillet(zaokr_glenie4_edges, radius=ZAOKR_GLENIE4_R)


solid = part_1.part
